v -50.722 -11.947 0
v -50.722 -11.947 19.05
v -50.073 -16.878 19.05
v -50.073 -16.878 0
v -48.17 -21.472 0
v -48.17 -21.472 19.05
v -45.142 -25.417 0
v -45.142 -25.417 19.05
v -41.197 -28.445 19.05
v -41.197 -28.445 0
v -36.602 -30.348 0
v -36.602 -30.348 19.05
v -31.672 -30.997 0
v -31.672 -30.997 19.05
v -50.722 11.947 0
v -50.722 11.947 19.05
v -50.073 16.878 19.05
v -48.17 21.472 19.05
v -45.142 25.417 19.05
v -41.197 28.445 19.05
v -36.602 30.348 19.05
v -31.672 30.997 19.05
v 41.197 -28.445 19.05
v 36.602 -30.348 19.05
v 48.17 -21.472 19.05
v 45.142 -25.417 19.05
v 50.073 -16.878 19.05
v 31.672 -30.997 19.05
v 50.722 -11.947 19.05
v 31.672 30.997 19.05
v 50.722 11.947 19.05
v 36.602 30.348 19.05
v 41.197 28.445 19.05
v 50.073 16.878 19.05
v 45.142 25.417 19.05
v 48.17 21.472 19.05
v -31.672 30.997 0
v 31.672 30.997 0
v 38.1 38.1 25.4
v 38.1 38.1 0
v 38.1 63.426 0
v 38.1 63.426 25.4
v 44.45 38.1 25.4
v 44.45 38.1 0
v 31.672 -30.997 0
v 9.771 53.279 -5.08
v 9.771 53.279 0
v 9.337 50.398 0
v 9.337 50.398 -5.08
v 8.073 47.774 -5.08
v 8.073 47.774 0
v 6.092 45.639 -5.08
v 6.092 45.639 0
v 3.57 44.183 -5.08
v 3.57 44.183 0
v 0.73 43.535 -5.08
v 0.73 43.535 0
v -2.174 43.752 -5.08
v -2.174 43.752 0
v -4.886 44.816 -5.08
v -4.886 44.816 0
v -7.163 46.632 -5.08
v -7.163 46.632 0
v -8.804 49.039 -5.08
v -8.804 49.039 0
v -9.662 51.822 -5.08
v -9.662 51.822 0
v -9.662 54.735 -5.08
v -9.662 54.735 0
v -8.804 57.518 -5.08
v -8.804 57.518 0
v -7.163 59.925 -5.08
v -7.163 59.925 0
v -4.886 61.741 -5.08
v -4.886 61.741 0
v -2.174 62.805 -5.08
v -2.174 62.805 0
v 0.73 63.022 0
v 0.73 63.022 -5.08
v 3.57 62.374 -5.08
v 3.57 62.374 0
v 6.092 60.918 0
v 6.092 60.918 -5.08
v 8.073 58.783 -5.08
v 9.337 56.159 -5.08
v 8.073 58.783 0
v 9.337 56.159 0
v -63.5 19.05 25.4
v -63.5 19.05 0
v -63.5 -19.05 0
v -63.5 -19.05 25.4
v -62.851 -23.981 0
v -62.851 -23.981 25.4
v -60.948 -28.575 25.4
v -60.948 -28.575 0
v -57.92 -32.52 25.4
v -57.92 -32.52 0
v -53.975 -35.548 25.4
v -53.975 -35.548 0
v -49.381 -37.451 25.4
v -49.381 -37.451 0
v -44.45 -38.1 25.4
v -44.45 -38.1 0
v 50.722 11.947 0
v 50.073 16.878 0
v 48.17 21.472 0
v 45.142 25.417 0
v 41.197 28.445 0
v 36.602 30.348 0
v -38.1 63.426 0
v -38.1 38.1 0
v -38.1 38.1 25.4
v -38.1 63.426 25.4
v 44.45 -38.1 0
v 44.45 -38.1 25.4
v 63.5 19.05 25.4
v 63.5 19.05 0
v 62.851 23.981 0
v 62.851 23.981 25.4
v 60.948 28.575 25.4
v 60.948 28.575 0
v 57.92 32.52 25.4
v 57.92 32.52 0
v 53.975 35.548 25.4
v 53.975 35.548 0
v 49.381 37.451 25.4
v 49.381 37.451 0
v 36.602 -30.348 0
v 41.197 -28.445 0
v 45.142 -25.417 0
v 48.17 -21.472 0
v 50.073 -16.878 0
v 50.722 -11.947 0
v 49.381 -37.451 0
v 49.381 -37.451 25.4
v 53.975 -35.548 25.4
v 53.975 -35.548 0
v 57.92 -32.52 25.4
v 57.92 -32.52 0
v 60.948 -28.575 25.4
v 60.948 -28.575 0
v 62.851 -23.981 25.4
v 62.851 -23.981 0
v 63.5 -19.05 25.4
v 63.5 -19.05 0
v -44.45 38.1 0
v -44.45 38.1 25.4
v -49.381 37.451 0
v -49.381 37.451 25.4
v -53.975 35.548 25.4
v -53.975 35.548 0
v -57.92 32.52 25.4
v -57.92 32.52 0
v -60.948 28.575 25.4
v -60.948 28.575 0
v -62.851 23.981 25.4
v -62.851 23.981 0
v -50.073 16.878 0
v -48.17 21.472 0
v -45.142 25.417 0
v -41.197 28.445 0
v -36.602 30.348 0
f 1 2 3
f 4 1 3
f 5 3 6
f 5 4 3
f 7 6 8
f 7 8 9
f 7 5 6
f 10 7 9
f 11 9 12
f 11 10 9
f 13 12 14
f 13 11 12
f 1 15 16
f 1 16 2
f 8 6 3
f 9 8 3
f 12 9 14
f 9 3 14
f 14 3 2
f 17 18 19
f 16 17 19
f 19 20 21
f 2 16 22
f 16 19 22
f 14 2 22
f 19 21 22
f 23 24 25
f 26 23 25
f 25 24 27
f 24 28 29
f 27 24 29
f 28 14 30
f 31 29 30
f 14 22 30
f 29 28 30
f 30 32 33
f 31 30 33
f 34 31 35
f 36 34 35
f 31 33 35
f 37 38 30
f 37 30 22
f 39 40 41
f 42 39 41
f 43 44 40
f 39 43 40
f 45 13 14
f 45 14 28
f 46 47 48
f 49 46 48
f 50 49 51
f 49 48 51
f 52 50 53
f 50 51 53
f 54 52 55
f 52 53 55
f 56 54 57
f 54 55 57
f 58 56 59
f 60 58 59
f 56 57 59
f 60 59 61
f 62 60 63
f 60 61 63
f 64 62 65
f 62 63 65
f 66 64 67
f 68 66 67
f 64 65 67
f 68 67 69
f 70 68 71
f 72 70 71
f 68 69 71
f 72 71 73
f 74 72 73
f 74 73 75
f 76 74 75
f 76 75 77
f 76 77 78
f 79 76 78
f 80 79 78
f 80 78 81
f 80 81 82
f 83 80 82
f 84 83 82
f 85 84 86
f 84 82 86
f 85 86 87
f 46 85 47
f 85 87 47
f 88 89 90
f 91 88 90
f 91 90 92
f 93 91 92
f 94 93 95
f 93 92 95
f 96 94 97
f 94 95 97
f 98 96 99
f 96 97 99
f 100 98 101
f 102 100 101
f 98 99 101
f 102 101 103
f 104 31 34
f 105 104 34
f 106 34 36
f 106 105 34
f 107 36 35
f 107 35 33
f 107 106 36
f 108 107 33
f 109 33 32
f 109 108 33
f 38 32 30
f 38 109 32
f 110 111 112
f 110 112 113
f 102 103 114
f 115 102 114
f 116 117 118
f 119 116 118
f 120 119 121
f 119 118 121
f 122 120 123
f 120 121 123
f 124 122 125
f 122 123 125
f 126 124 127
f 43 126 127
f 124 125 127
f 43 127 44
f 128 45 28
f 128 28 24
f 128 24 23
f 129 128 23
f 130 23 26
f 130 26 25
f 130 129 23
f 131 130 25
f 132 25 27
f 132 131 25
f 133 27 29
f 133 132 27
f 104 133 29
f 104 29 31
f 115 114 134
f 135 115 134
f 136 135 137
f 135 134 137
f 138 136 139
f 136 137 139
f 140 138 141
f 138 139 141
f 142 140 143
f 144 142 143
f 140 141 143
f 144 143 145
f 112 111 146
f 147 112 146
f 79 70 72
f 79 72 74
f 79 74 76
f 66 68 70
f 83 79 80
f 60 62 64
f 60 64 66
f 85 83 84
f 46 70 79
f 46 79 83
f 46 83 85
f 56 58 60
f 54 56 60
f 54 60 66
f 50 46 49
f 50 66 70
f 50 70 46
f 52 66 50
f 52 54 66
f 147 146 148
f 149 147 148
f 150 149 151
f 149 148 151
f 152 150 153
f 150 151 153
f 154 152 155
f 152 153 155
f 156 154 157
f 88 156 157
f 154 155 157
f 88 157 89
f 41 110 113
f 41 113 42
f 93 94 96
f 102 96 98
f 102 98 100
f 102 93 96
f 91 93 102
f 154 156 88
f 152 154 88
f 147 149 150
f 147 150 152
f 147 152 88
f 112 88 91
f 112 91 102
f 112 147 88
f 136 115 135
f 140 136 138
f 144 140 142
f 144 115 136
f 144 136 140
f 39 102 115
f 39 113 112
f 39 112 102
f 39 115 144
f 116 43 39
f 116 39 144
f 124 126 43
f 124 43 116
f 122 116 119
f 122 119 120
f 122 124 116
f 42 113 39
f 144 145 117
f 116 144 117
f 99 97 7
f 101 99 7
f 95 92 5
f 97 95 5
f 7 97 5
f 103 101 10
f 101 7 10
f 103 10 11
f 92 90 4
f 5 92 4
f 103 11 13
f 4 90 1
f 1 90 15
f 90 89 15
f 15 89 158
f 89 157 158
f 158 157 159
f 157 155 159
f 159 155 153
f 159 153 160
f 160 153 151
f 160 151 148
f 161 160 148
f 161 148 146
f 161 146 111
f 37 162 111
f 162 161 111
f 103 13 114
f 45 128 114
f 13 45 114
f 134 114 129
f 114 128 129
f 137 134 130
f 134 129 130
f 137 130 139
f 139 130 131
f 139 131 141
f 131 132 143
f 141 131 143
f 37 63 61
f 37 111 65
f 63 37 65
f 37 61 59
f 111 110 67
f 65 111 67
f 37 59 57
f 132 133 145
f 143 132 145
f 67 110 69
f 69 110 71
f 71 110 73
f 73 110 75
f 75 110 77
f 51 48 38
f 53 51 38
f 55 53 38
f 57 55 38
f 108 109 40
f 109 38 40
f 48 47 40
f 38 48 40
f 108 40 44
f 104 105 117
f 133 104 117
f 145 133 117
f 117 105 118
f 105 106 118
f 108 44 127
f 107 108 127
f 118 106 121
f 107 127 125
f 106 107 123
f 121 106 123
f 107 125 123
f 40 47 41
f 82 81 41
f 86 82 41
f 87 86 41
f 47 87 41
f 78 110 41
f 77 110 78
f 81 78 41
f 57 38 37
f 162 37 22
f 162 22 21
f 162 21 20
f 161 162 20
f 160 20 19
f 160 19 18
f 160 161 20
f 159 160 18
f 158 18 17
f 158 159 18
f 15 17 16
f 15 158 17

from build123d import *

# Parameters (mm, degrees)
F0_W     = 76.2
F0_H     = 25.326092267
F1_DEPTH = 25.4
F2_DEPTH = 19.05
F3_R     = 9.771245389
F4_DEPTH = 5.08


with BuildPart() as f1:
    # F0 (on Top) → F1 (new body)
    with BuildSketch(Plane.XY):
        with BuildLine():
            ThreePointArc((-63.5, -19.05), (-57.9203841816, -32.5203841816), (-44.45, -38.1))
            Line((-44.45, -38.1), (44.45, -38.1))
            ThreePointArc((44.45, -38.1), (57.9203841816, -32.5203841816), (63.5, -19.05))
            Line((63.5, -19.05), (63.5, 19.05))
            ThreePointArc((63.5, 19.05), (57.9203841816, 32.5203841816), (44.45, 38.1))
            Line((44.45, 38.1), (38.1, 38.1))
            Line((38.1, 38.1), (-38.1, 38.1))
            Line((-38.1, 38.1), (-44.45, 38.1))
            ThreePointArc((-44.45, 38.1), (-57.9203841816, 32.5203841816), (-63.5, 19.05))
            Line((-63.5, 19.05), (-63.5, -19.05))
        make_face()
        with BuildLine():
            ThreePointArc((-50.7219098508, 11.9470546514), (-45.1422940324, 25.417438833), (-31.6719098508, 30.9970546514))
            Line((-31.6719098508, 30.9970546514), (31.6719098508, 30.9970546514))
            ThreePointArc((31.6719098508, 30.9970546514), (45.1422940324, 25.417438833), (50.7219098508, 11.9470546514))
            Line((50.7219098508, 11.9470546514), (50.7219098508, -11.9470546514))
            ThreePointArc((50.7219098508, -11.9470546514), (45.1422940324, -25.417438833), (31.6719098508, -30.9970546514))
            Line((31.6719098508, -30.9970546514), (-31.6719098508, -30.9970546514))
            ThreePointArc((-31.6719098508, -30.9970546514), (-45.1422940324, -25.417438833), (-50.7219098508, -11.9470546514))
            Line((-50.7219098508, -11.9470546514), (-50.7219098508, 11.9470546514))
        make_face(mode=Mode.SUBTRACT)
        with BuildLine():
            Line((31.6719098508, 30.9970546514), (-31.6719098508, 30.9970546514))
            ThreePointArc((-31.6719098508, 30.9970546514), (-45.1422940324, 25.417438833), (-50.7219098508, 11.9470546514))
            Line((-50.7219098508, 11.9470546514), (-50.7219098508, -11.9470546514))
            ThreePointArc((-50.7219098508, -11.9470546514), (-45.1422940324, -25.417438833), (-31.6719098508, -30.9970546514))
            Line((-31.6719098508, -30.9970546514), (31.6719098508, -30.9970546514))
            ThreePointArc((31.6719098508, -30.9970546514), (45.1422940324, -25.417438833), (50.7219098508, -11.9470546514))
            Line((50.7219098508, -11.9470546514), (50.7219098508, 11.9470546514))
            ThreePointArc((50.7219098508, 11.9470546514), (45.1422940324, 25.417438833), (31.6719098508, 30.9970546514))
        make_face()
        with Locations((0, 50.7630461335)):
            Rectangle(F0_W, F0_H)
    extrude(amount=F1_DEPTH)

    # F0 (on Top) → F2 (cut)
    with BuildSketch(Plane.XY):
        with BuildLine():
            Line((31.6719098508, 30.9970546514), (-31.6719098508, 30.9970546514))
            ThreePointArc((-31.6719098508, 30.9970546514), (-45.1422940324, 25.417438833), (-50.7219098508, 11.9470546514))
            Line((-50.7219098508, 11.9470546514), (-50.7219098508, -11.9470546514))
            ThreePointArc((-50.7219098508, -11.9470546514), (-45.1422940324, -25.417438833), (-31.6719098508, -30.9970546514))
            Line((-31.6719098508, -30.9970546514), (31.6719098508, -30.9970546514))
            ThreePointArc((31.6719098508, -30.9970546514), (45.1422940324, -25.417438833), (50.7219098508, -11.9470546514))
            Line((50.7219098508, -11.9470546514), (50.7219098508, 11.9470546514))
            ThreePointArc((50.7219098508, 11.9470546514), (45.1422940324, 25.417438833), (31.6719098508, 30.9970546514))
        make_face()
    extrude(amount=F2_DEPTH, mode=Mode.SUBTRACT)

    # F3 (on face) → F4 (join)
    with BuildSketch(Plane(origin=(0, 0, 0), x_dir=(1, 0, 0), z_dir=(0, 0, -1))):
        with Locations((0, -53.2785505056)):
            Circle(F3_R)
    extrude(amount=F4_DEPTH)


solid = f1.part
